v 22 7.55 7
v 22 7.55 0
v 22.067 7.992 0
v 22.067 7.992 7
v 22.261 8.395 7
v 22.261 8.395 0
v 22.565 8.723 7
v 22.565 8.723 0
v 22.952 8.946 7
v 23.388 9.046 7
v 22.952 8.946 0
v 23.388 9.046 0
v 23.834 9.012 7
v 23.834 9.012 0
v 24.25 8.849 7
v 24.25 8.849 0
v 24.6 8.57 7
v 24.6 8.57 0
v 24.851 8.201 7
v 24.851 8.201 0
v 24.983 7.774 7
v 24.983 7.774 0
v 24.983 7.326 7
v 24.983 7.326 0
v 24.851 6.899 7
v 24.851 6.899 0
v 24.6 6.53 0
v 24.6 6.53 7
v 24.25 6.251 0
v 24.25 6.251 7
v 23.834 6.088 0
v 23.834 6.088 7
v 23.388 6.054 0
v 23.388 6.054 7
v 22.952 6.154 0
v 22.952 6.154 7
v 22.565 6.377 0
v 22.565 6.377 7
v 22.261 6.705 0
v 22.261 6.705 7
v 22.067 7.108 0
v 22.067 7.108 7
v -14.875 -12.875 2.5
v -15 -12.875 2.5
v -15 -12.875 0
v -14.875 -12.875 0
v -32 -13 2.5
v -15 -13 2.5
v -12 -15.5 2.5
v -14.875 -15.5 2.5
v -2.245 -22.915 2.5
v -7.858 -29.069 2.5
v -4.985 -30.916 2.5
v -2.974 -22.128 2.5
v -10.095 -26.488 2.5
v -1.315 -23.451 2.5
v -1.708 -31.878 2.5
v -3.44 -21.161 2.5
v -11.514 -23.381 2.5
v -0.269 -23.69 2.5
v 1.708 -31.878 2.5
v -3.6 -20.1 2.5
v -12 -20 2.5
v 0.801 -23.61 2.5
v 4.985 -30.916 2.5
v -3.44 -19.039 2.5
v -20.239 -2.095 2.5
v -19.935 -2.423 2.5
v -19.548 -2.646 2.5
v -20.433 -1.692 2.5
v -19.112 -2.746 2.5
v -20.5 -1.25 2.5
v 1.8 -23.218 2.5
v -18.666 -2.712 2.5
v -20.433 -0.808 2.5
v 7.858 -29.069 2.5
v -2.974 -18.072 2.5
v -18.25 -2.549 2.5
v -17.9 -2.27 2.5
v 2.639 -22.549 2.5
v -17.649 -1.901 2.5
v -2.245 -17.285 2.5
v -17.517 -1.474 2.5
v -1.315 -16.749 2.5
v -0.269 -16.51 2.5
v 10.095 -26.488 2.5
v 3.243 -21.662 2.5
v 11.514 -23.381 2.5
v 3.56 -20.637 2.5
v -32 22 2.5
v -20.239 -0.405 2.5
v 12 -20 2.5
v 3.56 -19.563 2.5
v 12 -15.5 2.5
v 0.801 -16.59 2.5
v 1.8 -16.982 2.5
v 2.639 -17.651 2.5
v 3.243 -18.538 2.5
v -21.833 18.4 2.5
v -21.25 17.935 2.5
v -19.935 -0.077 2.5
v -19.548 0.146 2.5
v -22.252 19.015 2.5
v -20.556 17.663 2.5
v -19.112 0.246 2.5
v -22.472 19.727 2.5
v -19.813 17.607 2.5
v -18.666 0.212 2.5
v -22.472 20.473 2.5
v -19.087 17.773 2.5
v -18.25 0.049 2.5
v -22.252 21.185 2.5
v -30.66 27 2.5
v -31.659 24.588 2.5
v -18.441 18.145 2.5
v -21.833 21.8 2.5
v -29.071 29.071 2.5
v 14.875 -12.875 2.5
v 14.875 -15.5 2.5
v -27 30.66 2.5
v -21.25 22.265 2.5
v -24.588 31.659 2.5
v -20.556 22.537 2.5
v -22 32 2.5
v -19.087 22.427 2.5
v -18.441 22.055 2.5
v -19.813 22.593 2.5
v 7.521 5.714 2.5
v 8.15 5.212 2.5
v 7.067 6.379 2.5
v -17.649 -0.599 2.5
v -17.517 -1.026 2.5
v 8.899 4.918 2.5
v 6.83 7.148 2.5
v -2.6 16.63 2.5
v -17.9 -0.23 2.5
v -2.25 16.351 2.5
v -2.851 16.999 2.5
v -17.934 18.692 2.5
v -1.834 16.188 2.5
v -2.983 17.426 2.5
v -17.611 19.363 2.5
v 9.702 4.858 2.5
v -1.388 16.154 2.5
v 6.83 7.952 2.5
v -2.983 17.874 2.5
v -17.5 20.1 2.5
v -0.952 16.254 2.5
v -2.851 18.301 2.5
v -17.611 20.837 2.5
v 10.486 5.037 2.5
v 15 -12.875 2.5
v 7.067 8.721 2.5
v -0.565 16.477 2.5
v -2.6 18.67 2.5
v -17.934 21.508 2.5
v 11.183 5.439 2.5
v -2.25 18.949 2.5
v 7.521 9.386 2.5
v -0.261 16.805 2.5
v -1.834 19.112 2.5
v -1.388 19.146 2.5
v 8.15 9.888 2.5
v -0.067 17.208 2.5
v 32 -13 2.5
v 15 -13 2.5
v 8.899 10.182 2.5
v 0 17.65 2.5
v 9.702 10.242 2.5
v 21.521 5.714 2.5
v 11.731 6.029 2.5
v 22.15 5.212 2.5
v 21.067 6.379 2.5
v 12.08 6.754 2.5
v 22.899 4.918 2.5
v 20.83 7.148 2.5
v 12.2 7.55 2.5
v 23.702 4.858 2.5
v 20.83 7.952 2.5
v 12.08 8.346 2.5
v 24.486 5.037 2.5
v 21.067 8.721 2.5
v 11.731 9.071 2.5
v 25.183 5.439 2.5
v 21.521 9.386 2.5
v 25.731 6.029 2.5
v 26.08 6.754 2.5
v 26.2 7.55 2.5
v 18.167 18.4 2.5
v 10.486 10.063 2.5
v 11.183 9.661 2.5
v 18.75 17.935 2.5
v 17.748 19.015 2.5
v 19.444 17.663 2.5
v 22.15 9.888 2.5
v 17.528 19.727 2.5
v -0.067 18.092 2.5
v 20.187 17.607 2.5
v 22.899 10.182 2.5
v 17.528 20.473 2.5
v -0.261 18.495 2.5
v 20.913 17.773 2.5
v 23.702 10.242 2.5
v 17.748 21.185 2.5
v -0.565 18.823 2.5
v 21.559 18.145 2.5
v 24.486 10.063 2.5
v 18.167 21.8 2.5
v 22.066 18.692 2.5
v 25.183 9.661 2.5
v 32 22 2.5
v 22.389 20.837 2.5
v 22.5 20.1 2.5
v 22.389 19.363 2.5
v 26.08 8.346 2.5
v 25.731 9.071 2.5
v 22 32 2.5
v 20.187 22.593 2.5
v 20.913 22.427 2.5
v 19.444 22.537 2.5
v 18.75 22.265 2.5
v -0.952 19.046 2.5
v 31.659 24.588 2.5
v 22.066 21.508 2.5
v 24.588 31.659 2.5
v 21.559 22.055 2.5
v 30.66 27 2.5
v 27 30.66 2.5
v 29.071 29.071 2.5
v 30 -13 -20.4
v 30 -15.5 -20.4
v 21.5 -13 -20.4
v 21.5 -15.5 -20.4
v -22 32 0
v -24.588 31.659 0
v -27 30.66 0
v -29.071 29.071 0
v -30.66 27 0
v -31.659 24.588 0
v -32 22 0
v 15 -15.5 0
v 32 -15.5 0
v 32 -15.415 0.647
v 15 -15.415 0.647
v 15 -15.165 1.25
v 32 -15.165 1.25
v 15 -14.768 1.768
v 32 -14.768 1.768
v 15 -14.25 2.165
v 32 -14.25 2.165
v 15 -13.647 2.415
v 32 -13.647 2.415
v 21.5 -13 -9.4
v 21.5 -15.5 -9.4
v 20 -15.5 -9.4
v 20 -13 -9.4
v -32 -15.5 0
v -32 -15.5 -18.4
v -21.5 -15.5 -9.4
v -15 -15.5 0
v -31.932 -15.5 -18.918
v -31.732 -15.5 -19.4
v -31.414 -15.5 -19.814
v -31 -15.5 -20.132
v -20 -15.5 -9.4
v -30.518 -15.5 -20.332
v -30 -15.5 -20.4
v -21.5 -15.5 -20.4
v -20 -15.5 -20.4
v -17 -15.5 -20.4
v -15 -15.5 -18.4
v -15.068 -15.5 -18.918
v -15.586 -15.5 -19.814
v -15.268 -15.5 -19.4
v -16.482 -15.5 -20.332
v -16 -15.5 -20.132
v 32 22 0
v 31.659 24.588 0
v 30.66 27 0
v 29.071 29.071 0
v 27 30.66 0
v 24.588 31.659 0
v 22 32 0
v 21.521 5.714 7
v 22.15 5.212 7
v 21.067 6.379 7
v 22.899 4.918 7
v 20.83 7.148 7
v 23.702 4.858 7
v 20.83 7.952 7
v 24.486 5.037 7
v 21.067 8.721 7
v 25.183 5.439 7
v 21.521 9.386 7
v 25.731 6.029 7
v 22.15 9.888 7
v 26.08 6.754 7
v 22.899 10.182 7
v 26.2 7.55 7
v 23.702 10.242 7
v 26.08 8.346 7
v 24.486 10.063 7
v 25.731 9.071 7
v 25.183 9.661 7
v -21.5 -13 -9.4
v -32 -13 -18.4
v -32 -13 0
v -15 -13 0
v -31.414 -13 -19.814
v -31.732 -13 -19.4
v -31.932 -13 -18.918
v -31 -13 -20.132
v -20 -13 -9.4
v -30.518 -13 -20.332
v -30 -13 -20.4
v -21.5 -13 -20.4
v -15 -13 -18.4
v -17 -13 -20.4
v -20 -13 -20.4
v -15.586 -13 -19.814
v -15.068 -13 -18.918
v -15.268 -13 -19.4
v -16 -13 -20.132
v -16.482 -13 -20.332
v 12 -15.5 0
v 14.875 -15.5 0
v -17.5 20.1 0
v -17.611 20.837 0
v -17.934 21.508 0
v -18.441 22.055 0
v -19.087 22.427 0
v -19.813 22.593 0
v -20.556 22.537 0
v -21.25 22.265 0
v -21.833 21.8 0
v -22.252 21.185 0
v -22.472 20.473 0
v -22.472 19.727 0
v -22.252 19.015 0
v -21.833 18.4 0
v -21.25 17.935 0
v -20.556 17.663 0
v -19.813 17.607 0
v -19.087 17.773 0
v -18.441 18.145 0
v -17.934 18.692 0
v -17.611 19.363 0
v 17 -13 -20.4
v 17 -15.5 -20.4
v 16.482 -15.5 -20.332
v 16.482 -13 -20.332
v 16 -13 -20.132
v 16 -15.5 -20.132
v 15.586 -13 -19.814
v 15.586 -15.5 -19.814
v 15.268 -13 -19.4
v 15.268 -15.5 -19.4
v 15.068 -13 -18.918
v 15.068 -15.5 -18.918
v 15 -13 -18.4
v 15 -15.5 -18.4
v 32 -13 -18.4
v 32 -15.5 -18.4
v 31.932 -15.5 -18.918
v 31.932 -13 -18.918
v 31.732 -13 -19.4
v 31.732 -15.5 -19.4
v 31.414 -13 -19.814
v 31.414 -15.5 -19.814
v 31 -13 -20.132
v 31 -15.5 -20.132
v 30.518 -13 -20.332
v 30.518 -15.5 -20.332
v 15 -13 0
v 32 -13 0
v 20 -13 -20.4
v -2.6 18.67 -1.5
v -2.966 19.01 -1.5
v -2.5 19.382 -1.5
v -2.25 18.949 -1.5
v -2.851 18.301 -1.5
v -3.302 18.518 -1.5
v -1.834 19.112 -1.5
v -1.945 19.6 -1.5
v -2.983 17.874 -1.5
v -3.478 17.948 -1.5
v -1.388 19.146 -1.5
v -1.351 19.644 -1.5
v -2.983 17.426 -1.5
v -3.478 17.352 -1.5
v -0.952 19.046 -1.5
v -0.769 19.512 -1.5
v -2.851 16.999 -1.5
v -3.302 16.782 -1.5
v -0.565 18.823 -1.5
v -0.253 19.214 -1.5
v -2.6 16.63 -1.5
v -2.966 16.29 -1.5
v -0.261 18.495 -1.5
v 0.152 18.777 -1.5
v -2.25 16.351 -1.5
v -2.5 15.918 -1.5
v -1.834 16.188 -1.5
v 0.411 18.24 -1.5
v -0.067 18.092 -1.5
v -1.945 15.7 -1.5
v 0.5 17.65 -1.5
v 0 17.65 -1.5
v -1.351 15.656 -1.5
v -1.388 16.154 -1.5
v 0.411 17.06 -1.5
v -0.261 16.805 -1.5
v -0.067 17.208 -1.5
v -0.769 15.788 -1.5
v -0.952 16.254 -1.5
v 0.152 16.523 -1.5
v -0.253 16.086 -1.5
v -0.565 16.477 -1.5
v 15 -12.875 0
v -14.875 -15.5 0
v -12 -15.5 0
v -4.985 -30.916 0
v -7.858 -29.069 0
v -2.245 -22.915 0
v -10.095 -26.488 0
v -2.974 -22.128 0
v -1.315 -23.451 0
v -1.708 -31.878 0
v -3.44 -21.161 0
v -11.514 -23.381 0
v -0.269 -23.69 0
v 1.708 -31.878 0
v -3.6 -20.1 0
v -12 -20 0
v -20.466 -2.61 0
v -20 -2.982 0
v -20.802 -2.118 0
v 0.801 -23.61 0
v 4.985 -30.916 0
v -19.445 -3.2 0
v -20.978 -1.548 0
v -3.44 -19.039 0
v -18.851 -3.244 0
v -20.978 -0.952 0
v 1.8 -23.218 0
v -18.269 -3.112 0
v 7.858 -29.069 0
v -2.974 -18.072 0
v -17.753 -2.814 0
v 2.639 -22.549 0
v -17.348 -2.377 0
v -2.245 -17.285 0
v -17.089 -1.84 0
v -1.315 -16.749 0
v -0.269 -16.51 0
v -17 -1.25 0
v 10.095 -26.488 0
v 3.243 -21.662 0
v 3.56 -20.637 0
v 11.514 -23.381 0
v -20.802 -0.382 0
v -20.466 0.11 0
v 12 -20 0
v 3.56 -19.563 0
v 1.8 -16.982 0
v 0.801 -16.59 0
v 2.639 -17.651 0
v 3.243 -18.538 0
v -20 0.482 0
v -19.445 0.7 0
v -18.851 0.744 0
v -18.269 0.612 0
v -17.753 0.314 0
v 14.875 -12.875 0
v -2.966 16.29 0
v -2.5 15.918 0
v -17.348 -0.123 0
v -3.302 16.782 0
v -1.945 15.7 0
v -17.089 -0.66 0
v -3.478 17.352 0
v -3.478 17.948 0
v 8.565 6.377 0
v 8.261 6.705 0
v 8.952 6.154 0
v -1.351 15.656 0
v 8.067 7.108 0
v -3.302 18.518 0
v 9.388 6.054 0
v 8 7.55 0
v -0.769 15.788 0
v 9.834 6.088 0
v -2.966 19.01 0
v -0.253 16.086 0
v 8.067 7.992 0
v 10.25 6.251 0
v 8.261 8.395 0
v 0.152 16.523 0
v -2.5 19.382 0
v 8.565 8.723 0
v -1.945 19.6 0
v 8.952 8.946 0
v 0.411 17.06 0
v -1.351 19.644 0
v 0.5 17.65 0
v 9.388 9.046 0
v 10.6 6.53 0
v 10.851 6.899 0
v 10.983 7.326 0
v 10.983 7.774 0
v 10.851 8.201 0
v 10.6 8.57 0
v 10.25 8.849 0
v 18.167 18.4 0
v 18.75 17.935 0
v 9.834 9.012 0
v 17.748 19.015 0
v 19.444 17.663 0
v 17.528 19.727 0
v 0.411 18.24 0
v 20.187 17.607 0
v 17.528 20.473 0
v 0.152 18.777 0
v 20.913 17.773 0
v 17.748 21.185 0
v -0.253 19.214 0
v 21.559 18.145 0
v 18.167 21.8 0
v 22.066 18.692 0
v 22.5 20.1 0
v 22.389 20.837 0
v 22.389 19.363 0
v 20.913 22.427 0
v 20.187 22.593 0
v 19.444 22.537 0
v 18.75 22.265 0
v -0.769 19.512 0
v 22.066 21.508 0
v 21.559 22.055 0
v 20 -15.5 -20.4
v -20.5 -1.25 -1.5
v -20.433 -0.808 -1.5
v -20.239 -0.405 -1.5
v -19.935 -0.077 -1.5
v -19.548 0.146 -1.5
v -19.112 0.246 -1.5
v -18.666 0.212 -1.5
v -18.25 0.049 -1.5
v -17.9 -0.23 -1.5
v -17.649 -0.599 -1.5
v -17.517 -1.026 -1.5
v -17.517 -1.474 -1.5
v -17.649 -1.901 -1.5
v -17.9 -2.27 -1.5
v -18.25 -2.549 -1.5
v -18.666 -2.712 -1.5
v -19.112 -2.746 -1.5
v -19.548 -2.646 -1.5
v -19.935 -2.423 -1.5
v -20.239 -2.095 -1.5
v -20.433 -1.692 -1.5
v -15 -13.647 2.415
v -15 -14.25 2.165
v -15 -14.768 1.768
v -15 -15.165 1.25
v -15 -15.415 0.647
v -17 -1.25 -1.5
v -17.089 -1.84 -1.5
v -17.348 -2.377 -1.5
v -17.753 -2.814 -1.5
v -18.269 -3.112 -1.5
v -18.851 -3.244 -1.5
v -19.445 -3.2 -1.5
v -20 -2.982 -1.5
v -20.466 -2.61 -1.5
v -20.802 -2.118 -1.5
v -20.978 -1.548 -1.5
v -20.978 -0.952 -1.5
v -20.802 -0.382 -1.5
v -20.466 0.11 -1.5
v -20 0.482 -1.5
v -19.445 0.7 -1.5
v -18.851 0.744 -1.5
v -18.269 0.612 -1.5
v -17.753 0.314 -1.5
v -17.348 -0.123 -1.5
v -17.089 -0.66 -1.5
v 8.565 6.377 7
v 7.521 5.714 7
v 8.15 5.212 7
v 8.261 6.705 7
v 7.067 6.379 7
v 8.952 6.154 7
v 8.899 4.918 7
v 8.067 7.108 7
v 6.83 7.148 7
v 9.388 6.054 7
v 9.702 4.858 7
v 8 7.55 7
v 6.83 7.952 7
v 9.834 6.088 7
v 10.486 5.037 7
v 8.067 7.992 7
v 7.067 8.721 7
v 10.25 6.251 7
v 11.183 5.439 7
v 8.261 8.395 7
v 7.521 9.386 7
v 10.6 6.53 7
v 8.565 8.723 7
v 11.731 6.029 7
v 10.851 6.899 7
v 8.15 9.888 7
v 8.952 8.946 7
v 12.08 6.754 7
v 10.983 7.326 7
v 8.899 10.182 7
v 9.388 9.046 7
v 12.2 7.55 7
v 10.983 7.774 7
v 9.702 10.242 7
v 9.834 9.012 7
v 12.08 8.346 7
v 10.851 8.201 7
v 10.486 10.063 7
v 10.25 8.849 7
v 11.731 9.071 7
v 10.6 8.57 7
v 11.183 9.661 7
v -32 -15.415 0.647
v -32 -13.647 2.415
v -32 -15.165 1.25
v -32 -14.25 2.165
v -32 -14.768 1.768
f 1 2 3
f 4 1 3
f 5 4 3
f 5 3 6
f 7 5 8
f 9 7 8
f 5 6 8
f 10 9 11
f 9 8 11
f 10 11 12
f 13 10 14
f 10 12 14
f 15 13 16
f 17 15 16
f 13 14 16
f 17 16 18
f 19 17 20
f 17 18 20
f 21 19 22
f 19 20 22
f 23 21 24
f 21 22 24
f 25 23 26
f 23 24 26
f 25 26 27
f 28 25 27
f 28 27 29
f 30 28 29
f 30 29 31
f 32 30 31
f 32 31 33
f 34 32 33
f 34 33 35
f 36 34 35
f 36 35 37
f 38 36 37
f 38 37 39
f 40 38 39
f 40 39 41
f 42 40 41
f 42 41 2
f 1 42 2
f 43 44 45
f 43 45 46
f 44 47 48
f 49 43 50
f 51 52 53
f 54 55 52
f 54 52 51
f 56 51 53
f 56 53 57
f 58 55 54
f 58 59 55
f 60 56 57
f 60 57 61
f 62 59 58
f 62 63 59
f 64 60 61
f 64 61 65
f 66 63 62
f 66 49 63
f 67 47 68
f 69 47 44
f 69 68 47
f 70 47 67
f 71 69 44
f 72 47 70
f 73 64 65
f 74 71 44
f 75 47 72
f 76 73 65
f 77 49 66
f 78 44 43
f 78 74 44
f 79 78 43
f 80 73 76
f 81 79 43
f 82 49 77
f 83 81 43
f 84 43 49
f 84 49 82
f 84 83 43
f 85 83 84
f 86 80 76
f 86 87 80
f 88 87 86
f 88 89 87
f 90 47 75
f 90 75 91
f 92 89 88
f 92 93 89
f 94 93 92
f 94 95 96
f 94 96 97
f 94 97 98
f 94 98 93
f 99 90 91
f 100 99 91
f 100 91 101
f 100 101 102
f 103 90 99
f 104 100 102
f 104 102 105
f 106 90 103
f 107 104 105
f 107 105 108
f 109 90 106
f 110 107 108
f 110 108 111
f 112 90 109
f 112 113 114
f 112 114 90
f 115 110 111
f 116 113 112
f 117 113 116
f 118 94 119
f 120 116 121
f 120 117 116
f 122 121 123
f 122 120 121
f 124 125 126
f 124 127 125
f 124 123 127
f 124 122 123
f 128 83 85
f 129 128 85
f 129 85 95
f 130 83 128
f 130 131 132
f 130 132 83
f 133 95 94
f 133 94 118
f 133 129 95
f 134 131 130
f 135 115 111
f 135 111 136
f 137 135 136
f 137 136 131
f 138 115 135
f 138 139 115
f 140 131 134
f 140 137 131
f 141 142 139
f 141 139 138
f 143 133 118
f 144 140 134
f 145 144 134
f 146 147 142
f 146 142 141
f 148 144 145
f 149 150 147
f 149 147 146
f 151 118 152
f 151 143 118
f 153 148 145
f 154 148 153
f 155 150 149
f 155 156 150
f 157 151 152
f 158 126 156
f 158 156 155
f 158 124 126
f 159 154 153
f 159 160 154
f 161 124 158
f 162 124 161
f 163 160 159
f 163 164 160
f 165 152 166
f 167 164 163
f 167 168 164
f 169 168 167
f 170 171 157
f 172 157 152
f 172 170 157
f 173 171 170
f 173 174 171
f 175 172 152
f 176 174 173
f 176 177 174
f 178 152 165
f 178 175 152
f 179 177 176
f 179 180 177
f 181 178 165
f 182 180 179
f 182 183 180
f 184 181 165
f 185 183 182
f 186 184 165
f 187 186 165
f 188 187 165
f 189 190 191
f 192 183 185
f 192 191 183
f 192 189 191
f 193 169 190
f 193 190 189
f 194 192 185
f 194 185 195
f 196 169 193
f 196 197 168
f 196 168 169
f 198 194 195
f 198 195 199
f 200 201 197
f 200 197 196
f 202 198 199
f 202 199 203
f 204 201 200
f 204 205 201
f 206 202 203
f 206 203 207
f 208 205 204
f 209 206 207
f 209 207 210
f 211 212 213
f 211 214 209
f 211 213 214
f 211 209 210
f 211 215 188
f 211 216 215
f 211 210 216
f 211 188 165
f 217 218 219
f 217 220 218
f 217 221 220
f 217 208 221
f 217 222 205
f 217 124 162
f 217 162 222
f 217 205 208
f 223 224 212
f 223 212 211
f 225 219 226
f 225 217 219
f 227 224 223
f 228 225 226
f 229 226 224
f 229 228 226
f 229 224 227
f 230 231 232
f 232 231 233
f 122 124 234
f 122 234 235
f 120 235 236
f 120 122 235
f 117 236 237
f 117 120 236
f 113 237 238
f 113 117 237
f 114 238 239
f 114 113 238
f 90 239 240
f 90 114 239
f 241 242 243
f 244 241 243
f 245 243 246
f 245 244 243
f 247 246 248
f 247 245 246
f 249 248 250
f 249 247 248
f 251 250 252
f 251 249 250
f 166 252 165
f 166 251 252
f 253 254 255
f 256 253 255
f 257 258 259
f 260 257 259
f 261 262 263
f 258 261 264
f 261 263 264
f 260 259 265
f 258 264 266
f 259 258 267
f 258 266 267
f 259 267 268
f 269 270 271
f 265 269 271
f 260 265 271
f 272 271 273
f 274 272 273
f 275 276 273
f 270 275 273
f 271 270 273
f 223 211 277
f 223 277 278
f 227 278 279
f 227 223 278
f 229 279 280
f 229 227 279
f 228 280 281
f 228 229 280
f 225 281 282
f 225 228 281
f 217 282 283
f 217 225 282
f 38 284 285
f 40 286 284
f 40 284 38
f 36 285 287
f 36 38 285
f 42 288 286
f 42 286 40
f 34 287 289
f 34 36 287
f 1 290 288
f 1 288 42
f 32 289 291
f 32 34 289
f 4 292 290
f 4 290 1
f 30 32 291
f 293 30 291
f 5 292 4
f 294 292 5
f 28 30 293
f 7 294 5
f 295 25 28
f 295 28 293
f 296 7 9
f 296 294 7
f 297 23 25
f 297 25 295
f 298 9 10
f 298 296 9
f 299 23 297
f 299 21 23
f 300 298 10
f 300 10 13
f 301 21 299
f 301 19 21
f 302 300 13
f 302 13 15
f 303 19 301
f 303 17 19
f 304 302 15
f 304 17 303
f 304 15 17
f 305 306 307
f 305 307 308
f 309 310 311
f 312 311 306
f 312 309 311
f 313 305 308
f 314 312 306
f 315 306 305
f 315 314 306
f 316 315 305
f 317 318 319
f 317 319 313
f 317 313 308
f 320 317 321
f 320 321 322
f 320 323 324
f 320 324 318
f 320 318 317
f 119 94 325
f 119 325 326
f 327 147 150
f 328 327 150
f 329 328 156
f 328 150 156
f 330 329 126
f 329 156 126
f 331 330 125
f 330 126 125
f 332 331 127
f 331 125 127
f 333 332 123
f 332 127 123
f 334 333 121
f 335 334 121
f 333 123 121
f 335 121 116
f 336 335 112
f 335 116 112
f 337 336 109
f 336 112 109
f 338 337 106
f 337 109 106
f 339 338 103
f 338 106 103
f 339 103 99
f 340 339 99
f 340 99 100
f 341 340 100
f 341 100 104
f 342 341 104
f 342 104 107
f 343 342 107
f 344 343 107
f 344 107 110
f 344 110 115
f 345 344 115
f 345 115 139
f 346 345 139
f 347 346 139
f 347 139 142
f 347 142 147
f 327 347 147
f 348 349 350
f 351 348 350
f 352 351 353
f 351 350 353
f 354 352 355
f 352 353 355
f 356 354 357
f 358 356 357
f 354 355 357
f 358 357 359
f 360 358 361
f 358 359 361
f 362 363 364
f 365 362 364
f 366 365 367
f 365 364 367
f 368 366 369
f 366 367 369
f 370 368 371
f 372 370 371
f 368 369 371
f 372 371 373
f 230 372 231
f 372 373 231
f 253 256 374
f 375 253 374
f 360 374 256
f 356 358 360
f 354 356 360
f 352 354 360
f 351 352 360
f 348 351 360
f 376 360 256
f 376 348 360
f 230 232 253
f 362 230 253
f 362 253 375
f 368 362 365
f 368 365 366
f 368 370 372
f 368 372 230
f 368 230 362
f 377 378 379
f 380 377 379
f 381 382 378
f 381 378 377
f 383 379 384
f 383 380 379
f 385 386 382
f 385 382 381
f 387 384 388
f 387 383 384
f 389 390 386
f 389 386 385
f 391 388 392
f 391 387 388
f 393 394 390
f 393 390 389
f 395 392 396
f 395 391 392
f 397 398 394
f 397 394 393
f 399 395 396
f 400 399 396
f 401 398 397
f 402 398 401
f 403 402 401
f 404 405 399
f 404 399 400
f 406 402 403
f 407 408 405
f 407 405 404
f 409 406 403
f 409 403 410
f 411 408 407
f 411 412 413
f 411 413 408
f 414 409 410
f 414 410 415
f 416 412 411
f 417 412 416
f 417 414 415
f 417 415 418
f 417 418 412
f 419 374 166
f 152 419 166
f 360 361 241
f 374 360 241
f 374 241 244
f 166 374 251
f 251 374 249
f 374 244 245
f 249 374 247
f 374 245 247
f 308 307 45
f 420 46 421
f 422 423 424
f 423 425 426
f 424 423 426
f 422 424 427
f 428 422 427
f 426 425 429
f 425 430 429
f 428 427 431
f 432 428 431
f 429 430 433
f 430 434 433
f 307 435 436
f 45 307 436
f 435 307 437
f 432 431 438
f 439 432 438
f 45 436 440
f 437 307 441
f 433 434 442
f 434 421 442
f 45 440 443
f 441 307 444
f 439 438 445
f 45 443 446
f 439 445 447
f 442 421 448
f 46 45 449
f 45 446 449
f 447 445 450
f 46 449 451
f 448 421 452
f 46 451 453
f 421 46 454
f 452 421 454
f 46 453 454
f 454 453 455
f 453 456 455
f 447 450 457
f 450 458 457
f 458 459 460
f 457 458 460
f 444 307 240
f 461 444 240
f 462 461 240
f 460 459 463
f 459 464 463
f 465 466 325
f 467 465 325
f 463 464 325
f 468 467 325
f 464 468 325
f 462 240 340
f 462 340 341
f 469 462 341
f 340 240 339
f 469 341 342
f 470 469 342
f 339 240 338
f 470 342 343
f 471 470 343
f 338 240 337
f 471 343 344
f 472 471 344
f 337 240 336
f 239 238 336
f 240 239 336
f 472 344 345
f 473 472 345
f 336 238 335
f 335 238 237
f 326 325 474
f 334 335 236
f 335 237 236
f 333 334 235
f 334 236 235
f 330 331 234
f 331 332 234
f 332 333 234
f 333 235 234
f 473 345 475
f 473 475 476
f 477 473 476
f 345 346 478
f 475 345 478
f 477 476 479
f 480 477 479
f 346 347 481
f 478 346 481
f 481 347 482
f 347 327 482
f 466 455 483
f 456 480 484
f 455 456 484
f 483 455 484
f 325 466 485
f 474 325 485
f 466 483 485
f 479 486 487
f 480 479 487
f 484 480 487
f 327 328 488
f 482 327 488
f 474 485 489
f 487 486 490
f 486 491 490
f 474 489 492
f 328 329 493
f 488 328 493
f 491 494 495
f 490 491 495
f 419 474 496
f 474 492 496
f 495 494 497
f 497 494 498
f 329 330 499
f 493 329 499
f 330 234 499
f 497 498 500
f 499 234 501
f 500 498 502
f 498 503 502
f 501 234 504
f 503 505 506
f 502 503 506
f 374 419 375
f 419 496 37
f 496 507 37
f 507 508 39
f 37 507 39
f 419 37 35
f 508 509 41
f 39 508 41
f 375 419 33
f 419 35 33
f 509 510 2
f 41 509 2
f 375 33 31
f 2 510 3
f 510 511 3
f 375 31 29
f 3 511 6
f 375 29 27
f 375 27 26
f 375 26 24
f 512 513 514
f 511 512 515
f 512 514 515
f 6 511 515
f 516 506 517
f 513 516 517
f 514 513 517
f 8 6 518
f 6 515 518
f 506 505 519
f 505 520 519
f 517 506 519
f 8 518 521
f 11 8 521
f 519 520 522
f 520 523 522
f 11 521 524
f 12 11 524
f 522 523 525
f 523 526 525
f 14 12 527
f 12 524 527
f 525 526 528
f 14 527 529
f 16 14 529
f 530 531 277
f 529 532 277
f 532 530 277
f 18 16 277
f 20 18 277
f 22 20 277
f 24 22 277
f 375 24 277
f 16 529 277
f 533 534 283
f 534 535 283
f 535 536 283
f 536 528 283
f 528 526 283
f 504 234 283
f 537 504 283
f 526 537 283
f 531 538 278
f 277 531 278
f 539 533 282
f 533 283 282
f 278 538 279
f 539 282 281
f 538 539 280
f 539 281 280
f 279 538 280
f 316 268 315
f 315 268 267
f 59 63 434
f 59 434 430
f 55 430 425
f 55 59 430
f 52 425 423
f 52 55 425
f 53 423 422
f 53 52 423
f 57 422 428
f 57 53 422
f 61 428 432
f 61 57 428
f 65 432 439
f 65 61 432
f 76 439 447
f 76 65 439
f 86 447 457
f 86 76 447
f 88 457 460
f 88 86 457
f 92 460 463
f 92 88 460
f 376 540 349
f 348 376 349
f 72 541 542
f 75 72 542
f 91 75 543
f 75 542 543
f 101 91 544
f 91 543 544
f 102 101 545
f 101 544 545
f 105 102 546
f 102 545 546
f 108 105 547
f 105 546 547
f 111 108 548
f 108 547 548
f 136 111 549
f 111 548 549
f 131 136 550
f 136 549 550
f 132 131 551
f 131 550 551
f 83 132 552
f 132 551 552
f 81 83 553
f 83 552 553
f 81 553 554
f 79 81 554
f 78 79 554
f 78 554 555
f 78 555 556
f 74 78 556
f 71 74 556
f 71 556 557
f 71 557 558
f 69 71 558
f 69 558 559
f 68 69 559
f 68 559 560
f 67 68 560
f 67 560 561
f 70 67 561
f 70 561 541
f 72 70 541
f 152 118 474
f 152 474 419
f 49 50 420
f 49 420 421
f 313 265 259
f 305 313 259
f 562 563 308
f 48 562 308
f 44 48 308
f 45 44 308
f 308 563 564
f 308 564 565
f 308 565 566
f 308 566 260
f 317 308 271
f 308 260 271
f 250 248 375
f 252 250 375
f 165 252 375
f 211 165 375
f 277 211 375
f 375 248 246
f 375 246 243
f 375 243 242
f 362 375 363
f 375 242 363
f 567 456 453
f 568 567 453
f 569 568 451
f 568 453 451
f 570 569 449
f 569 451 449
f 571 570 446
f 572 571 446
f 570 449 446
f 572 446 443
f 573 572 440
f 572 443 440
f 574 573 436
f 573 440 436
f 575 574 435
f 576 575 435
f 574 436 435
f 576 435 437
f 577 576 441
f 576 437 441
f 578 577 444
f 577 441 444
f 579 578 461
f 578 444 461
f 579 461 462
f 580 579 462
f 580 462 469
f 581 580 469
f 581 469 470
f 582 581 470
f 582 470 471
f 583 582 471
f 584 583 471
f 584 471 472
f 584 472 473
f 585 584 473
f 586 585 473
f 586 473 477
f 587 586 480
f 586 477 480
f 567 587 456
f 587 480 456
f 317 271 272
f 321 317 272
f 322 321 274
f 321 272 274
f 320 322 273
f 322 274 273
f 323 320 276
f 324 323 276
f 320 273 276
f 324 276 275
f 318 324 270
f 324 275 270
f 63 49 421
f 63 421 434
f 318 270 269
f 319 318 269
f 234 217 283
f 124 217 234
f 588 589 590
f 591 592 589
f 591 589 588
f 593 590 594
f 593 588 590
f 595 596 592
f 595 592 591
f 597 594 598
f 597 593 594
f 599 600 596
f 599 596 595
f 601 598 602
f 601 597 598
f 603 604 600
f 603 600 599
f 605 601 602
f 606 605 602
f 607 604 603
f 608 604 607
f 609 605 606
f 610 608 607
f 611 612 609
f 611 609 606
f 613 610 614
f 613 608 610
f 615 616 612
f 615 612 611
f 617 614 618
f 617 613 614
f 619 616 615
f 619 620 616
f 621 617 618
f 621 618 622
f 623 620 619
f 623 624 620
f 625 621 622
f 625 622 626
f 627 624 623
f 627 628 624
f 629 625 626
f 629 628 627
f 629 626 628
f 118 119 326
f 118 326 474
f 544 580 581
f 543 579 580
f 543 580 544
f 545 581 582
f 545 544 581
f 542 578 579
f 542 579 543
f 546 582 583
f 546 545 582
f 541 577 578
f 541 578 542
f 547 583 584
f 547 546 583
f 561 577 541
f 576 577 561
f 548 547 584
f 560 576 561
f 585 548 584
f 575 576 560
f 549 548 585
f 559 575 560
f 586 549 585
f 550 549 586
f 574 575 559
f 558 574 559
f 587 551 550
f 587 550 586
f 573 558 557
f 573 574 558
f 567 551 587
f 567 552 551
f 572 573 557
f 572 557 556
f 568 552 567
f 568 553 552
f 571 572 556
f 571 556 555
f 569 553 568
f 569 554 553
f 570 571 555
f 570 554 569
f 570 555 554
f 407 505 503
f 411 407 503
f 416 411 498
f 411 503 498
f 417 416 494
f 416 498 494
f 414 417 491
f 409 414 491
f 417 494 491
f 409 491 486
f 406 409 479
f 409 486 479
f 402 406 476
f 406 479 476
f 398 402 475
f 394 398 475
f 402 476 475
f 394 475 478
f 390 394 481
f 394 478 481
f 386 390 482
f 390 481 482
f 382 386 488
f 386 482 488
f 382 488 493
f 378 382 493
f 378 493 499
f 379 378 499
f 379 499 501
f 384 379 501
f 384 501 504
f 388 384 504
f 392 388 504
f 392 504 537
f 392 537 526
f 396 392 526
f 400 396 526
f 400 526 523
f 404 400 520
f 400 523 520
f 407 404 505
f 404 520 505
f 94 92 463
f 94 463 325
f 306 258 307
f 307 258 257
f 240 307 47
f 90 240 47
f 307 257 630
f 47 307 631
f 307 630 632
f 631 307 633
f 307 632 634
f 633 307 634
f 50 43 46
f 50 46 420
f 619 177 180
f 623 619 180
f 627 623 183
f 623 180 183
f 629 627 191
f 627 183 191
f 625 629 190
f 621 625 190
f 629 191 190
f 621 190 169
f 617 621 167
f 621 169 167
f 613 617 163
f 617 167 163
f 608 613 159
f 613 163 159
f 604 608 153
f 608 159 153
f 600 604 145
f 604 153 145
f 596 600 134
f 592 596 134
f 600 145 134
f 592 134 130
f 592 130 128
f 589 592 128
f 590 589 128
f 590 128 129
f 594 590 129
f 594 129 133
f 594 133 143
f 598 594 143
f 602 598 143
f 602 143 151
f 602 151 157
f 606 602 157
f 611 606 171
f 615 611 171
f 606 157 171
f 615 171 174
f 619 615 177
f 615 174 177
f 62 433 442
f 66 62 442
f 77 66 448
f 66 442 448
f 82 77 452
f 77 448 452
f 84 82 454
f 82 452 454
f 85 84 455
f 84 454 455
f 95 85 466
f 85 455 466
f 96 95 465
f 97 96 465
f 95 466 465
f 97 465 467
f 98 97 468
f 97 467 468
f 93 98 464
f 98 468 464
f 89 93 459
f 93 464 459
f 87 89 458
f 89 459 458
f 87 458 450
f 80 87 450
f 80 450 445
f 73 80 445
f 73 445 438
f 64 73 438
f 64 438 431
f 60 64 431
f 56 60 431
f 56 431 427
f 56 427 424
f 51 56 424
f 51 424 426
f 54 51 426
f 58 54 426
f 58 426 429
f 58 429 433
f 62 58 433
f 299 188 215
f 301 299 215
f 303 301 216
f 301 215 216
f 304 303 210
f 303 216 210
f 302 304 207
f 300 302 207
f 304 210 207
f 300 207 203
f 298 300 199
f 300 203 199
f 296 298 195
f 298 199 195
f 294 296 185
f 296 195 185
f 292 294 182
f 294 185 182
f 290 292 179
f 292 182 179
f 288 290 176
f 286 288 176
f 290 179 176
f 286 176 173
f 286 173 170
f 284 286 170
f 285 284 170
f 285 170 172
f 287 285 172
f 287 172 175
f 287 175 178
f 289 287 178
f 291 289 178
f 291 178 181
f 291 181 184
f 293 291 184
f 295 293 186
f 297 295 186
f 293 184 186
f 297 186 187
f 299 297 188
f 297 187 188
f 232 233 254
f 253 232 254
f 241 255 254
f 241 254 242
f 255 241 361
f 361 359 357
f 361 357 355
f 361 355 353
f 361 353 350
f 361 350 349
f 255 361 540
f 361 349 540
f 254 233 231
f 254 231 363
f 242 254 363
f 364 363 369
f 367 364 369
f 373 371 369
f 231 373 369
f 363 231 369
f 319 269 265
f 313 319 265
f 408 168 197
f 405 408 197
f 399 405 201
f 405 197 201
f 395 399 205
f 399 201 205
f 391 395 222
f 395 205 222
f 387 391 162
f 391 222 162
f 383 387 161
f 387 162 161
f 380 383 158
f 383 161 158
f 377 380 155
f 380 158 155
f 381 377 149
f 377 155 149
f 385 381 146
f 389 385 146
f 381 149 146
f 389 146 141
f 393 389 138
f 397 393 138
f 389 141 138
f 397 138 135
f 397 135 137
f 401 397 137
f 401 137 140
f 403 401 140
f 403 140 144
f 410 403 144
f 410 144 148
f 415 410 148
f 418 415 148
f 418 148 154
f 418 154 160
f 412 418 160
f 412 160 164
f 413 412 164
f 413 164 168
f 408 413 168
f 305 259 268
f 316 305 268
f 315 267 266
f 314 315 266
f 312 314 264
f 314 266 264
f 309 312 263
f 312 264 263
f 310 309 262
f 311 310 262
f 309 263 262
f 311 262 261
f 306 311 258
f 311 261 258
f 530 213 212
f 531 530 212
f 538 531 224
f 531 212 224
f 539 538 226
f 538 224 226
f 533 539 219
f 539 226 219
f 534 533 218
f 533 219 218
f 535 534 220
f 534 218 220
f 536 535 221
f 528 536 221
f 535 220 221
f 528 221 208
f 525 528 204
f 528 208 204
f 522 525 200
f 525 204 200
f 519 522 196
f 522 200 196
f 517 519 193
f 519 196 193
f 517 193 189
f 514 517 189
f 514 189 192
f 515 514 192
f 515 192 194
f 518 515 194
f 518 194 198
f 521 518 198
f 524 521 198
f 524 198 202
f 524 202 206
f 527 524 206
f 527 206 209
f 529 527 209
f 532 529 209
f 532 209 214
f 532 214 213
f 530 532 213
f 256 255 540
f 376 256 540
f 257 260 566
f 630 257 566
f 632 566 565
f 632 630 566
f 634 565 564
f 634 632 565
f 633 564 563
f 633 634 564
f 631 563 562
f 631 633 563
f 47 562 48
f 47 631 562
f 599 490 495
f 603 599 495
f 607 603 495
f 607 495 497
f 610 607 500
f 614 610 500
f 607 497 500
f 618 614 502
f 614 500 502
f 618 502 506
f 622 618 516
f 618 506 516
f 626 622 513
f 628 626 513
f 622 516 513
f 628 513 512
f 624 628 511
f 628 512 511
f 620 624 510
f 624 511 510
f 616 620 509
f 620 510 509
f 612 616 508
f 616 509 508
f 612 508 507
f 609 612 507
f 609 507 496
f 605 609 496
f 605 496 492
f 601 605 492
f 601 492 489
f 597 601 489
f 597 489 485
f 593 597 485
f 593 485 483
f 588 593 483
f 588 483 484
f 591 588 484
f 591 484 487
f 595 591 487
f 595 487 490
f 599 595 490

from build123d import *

# Parameters (mm, degrees)
BRIDA_BASE1_DEPTH                   = 2.5
CROQUIS16_W                         = 1.5
CROQUIS16_H                         = 11
CORTAR_EXTRUIR1_DEPTH               = 48.758002549
CROQUIS17_W                         = 1.5
CROQUIS17_H                         = 11
CORTAR_EXTRUIR2_DEPTH               = 48.758002549
CROQUIS18_R                         = 2
SALIENTE_EXTRUIR1_DEPTH             = 1.5
CROQUIS19_R                         = 2.7
SALIENTE_EXTRUIR2_DEPTH             = 4.5
CROQUIS20_R                         = 2.7
SALIENTE_EXTRUIR3_DEPTH             = 4.5
CROQUIS21_R                         = 2
SALIENTE_EXTRUIR4_DEPTH             = 1.5
DI_METRO_DE_TALADRO_3_0_3_1_D       = 3
DI_METRO_DE_TALADRO_3_0_3_2_D       = 3
DI_METRO_DE_TALADRO_3_0_3_2_DEPTH   = 8.5
DI_METRO_DE_TALADRO_7_2_7_2_1_D     = 7.2
DI_METRO_DE_TALADRO_7_2_7_2_1_DEPTH = 4
DI_METRO_DE_TALADRO_3_0_3_3_D       = 3
DI_METRO_DE_TALADRO_3_0_3_3_DEPTH   = 8.5
DI_METRO_DE_TALADRO_5_0_5_1_D       = 5
DI_METRO_DE_TALADRO_5_0_5_1_DEPTH   = 7
PLIEGUE_START                       = -35.363495408
PLIEGUE_CROQUIZADO1_OUTLINE_W       = 17
PLIEGUE_CROQUIZADO1_OUTLINE_H       = 2.5
PLIEGUE_CROQUIZADO1_DEPTH           = 19.863495408
PLIEGUE_START_2                     = -15.5
PLIEGUE_CROQUIZADO1_2_DEPTH         = 2.5
PLIEGUE_START_3                     = 15
PLIEGUE_CROQUIZADO1_3_DEPTH         = 18
PLIEGUE_CROQUIZADO2_OUTLINE_W       = 17
PLIEGUE_CROQUIZADO2_OUTLINE_H       = 2.5
PLIEGUE_CROQUIZADO2_DEPTH           = 19.863495408
PLIEGUE_CROQUIZADO2_2_DEPTH         = 2.5
PLIEGUE_START_4                     = -33
PLIEGUE_CROQUIZADO2_3_DEPTH         = 18


with BuildPart() as part:
    # Brida base1: sheet metal written as solids
    # Croquis11 → Brida base1 (new body)
    with BuildSketch(Plane.XY.offset(2.5)):
        with BuildLine():
            Line((-30, -35.363495408), (-17, -35.363495408))
            ThreePointArc((-17, -35.363495408), (-15.585786438, -34.777708971), (-15, -33.363495408))
            Line((-15, -33.363495408), (-15, -12.875))
            Line((-15, -12.875), (-14.875, -12.875))
            Line((-14.875, -12.875), (-14.875, -15.5))
            Line((-14.875, -15.5), (-12, -15.5))
            Line((-12, -15.5), (-12, -20))
            ThreePointArc((-12, -20), (0, -32), (12, -20))
            Line((12, -20), (12, -15.5))
            Line((12, -15.5), (14.875, -15.5))
            Line((14.875, -15.5), (14.875, -12.875))
            Line((14.875, -12.875), (15, -12.875))
            Line((15, -12.875), (15, -33.363495408))
            ThreePointArc((15, -33.363495408), (15.585786438, -34.777708971), (17, -35.363495408))
            Line((17, -35.363495408), (30, -35.363495408))
            ThreePointArc((30, -35.363495408), (31.414213562, -34.777708971), (32, -33.363495408))
            Line((32, -33.363495408), (32, 22))
            ThreePointArc((32, 22), (29.071067812, 29.071067812), (22, 32))
            Line((22, 32), (-22, 32))
            ThreePointArc((-22, 32), (-29.071067812, 29.071067812), (-32, 22))
            Line((-32, 22), (-32, -33.363495408))
            ThreePointArc((-32, -33.363495408), (-31.414213562, -34.777708971), (-30, -35.363495408))
        make_face()
    extrude(amount=-BRIDA_BASE1_DEPTH)

    # Croquis16 → Cortar-Extruir1 (cut, through all)
    with BuildSketch(Plane.XY.offset(2.5)):
        with Locations((-20.75, -29.863495408)):
            Rectangle(CROQUIS16_W, CROQUIS16_H)
    extrude(amount=-CORTAR_EXTRUIR1_DEPTH, mode=Mode.SUBTRACT)

    # Croquis17 → Cortar-Extruir2 (cut, through all)
    with BuildSketch(Plane(origin=(0, 0, 0), x_dir=(-1, 0, 0), z_dir=(0, 0, -1))):
        with Locations((-20.75, -29.863495408)):
            Rectangle(CROQUIS17_W, CROQUIS17_H)
    extrude(amount=-CORTAR_EXTRUIR2_DEPTH, mode=Mode.SUBTRACT)

    # Croquis18 → Saliente-Extruir1 (add)
    with BuildSketch(Plane(origin=(0, 0, 0), x_dir=(-1, 0, 0), z_dir=(0, 0, -1))):
        with Locations(Location((1.5, 17.65, 0), (0, 0, 180))):
            Circle(CROQUIS18_R)
    extrude(amount=SALIENTE_EXTRUIR1_DEPTH)

    # Croquis19 → Saliente-Extruir2 (add)
    with BuildSketch(Plane.XY.offset(2.5)):
        with Locations((23.5, 7.55)):
            Circle(CROQUIS19_R)
    extrude(amount=SALIENTE_EXTRUIR2_DEPTH)

    # Croquis20 → Saliente-Extruir3 (add)
    with BuildSketch(Plane.XY.offset(2.5)):
        with Locations((9.5, 7.55)):
            Circle(CROQUIS20_R)
    extrude(amount=SALIENTE_EXTRUIR3_DEPTH)

    # Croquis21 → Saliente-Extruir4 (add)
    with BuildSketch(Plane(origin=(0, 0, 0), x_dir=(-1, 0, 0), z_dir=(0, 0, -1))):
        with Locations(Location((19, -1.25, 0), (0, 0, 180))):
            Circle(CROQUIS21_R)
    extrude(amount=SALIENTE_EXTRUIR4_DEPTH)

    # Diámetro de taladro Ø3.0 (3)1 (through all)
    with Locations(Plane.XY.offset(2.5)):
        with Locations((-19, -1.25)):
            Hole(DI_METRO_DE_TALADRO_3_0_3_1_D / 2)

    # Diámetro de taladro Ø3.0 (3)2
    with Locations(Plane.XY.offset(7)):
        with Locations((23.5, 7.55), (9.5, 7.55)):
            Hole(DI_METRO_DE_TALADRO_3_0_3_2_D / 2, depth=DI_METRO_DE_TALADRO_3_0_3_2_DEPTH)

    # Diámetro de taladro Ø7.2 (7.2)1
    with Locations(Plane.XY.offset(2.5)):
        with Locations((0, -20.1)):
            Hole(DI_METRO_DE_TALADRO_7_2_7_2_1_D / 2, depth=DI_METRO_DE_TALADRO_7_2_7_2_1_DEPTH)

    # Diámetro de taladro Ø3.0 (3)3
    with Locations(Plane(origin=(0, 0, -1.5), x_dir=(-1, 0, 0), z_dir=(0, 0, -1))):
        with Locations((1.5, 17.65)):
            Hole(DI_METRO_DE_TALADRO_3_0_3_3_D / 2, depth=DI_METRO_DE_TALADRO_3_0_3_3_DEPTH)

    # Diámetro de taladro Ø5.0 (5)1
    with Locations(Plane(origin=(0, 0, 0), x_dir=(-1, 0, 0), z_dir=(0, 0, -1))):
        with Locations((20, 20.1), (-20, 20.1)):
            Hole(DI_METRO_DE_TALADRO_5_0_5_1_D / 2, depth=DI_METRO_DE_TALADRO_5_0_5_1_DEPTH)

    # Pliegue croquizado1: read off the stored shape, not the designer's step
    # Pliegue croquizado1 outline → Pliegue croquizado1 (cut)
    with BuildSketch(Plane(origin=(0, 0, 0), x_dir=(1, 0, 0), z_dir=(0, 1, 0)).offset(PLIEGUE_START)):
        with Locations((23.5, -1.25)):
            Rectangle(PLIEGUE_CROQUIZADO1_OUTLINE_W, PLIEGUE_CROQUIZADO1_OUTLINE_H)
    extrude(amount=PLIEGUE_CROQUIZADO1_DEPTH, mode=Mode.SUBTRACT)

    # Pliegue croquizado1 2 outline → Pliegue croquizado1 2 (add)
    with BuildSketch(Plane(origin=(0, 0, 0), x_dir=(1, 0, 0), z_dir=(0, 1, 0)).offset(PLIEGUE_START_2)):
        with BuildLine():
            Line((15, 0), (32, 0))
            Line((32, 0), (32, 18.4))
            ThreePointArc((32, 18.4), (31.414213562, 19.814213562), (30, 20.4))
            Line((30, 20.4), (21.5, 20.4))
            Line((21.5, 20.4), (21.5, 9.4))
            Line((21.5, 9.4), (20, 9.4))
            Line((20, 9.4), (20, 20.4))
            Line((20, 20.4), (17, 20.4))
            ThreePointArc((17, 20.4), (15.585786438, 19.814213562), (15, 18.4))
            Line((15, 18.4), (15, 0))
        make_face()
    extrude(amount=PLIEGUE_CROQUIZADO1_2_DEPTH)

    # Pliegue croquizado1 3 outline → Pliegue croquizado1 3 (cut)
    with BuildSketch(Plane.YZ.offset(PLIEGUE_START_3)):
        with BuildLine():
            Line((-15.5, 2.5), (-15.5, 0))
            ThreePointArc((-15.5, 0), (-14.767766953, 1.767766953), (-13, 2.5))
            Line((-13, 2.5), (-15.5, 2.5))
        make_face()
    extrude(amount=PLIEGUE_CROQUIZADO1_3_DEPTH, mode=Mode.SUBTRACT)

    # Pliegue croquizado2: read off the stored shape, not the designer's step
    # Pliegue croquizado2 outline → Pliegue croquizado2 (cut)
    with BuildSketch(Plane(origin=(0, 0, 0), x_dir=(1, 0, 0), z_dir=(0, 1, 0)).offset(PLIEGUE_START)):
        with Locations((-23.5, -1.25)):
            Rectangle(PLIEGUE_CROQUIZADO2_OUTLINE_W, PLIEGUE_CROQUIZADO2_OUTLINE_H)
    extrude(amount=PLIEGUE_CROQUIZADO2_DEPTH, mode=Mode.SUBTRACT)

    # Pliegue croquizado2 2 outline → Pliegue croquizado2 2 (add)
    with BuildSketch(Plane(origin=(0, 0, 0), x_dir=(1, 0, 0), z_dir=(0, 1, 0)).offset(PLIEGUE_START_2)):
        with BuildLine():
            ThreePointArc((-30, 20.4), (-31.414213562, 19.814213562), (-32, 18.4))
            Line((-32, 18.4), (-32, 0))
            Line((-32, 0), (-15, 0))
            Line((-15, 0), (-15, 18.4))
            ThreePointArc((-15, 18.4), (-15.585786438, 19.814213562), (-17, 20.4))
            Line((-17, 20.4), (-20, 20.4))
            Line((-20, 20.4), (-20, 9.4))
            Line((-20, 9.4), (-21.5, 9.4))
            Line((-21.5, 9.4), (-21.5, 20.4))
            Line((-21.5, 20.4), (-30, 20.4))
        make_face()
    extrude(amount=PLIEGUE_CROQUIZADO2_2_DEPTH)

    # Pliegue croquizado2 3 outline → Pliegue croquizado2 3 (cut)
    with BuildSketch(Plane.YZ.offset(PLIEGUE_START_4)):
        with BuildLine():
            Line((-15.5, 2.5), (-15.5, 0))
            ThreePointArc((-15.5, 0), (-14.767766953, 1.767766953), (-13, 2.5))
            Line((-13, 2.5), (-15.5, 2.5))
        make_face()
    extrude(amount=PLIEGUE_CROQUIZADO2_3_DEPTH, mode=Mode.SUBTRACT)


solid = part.part
